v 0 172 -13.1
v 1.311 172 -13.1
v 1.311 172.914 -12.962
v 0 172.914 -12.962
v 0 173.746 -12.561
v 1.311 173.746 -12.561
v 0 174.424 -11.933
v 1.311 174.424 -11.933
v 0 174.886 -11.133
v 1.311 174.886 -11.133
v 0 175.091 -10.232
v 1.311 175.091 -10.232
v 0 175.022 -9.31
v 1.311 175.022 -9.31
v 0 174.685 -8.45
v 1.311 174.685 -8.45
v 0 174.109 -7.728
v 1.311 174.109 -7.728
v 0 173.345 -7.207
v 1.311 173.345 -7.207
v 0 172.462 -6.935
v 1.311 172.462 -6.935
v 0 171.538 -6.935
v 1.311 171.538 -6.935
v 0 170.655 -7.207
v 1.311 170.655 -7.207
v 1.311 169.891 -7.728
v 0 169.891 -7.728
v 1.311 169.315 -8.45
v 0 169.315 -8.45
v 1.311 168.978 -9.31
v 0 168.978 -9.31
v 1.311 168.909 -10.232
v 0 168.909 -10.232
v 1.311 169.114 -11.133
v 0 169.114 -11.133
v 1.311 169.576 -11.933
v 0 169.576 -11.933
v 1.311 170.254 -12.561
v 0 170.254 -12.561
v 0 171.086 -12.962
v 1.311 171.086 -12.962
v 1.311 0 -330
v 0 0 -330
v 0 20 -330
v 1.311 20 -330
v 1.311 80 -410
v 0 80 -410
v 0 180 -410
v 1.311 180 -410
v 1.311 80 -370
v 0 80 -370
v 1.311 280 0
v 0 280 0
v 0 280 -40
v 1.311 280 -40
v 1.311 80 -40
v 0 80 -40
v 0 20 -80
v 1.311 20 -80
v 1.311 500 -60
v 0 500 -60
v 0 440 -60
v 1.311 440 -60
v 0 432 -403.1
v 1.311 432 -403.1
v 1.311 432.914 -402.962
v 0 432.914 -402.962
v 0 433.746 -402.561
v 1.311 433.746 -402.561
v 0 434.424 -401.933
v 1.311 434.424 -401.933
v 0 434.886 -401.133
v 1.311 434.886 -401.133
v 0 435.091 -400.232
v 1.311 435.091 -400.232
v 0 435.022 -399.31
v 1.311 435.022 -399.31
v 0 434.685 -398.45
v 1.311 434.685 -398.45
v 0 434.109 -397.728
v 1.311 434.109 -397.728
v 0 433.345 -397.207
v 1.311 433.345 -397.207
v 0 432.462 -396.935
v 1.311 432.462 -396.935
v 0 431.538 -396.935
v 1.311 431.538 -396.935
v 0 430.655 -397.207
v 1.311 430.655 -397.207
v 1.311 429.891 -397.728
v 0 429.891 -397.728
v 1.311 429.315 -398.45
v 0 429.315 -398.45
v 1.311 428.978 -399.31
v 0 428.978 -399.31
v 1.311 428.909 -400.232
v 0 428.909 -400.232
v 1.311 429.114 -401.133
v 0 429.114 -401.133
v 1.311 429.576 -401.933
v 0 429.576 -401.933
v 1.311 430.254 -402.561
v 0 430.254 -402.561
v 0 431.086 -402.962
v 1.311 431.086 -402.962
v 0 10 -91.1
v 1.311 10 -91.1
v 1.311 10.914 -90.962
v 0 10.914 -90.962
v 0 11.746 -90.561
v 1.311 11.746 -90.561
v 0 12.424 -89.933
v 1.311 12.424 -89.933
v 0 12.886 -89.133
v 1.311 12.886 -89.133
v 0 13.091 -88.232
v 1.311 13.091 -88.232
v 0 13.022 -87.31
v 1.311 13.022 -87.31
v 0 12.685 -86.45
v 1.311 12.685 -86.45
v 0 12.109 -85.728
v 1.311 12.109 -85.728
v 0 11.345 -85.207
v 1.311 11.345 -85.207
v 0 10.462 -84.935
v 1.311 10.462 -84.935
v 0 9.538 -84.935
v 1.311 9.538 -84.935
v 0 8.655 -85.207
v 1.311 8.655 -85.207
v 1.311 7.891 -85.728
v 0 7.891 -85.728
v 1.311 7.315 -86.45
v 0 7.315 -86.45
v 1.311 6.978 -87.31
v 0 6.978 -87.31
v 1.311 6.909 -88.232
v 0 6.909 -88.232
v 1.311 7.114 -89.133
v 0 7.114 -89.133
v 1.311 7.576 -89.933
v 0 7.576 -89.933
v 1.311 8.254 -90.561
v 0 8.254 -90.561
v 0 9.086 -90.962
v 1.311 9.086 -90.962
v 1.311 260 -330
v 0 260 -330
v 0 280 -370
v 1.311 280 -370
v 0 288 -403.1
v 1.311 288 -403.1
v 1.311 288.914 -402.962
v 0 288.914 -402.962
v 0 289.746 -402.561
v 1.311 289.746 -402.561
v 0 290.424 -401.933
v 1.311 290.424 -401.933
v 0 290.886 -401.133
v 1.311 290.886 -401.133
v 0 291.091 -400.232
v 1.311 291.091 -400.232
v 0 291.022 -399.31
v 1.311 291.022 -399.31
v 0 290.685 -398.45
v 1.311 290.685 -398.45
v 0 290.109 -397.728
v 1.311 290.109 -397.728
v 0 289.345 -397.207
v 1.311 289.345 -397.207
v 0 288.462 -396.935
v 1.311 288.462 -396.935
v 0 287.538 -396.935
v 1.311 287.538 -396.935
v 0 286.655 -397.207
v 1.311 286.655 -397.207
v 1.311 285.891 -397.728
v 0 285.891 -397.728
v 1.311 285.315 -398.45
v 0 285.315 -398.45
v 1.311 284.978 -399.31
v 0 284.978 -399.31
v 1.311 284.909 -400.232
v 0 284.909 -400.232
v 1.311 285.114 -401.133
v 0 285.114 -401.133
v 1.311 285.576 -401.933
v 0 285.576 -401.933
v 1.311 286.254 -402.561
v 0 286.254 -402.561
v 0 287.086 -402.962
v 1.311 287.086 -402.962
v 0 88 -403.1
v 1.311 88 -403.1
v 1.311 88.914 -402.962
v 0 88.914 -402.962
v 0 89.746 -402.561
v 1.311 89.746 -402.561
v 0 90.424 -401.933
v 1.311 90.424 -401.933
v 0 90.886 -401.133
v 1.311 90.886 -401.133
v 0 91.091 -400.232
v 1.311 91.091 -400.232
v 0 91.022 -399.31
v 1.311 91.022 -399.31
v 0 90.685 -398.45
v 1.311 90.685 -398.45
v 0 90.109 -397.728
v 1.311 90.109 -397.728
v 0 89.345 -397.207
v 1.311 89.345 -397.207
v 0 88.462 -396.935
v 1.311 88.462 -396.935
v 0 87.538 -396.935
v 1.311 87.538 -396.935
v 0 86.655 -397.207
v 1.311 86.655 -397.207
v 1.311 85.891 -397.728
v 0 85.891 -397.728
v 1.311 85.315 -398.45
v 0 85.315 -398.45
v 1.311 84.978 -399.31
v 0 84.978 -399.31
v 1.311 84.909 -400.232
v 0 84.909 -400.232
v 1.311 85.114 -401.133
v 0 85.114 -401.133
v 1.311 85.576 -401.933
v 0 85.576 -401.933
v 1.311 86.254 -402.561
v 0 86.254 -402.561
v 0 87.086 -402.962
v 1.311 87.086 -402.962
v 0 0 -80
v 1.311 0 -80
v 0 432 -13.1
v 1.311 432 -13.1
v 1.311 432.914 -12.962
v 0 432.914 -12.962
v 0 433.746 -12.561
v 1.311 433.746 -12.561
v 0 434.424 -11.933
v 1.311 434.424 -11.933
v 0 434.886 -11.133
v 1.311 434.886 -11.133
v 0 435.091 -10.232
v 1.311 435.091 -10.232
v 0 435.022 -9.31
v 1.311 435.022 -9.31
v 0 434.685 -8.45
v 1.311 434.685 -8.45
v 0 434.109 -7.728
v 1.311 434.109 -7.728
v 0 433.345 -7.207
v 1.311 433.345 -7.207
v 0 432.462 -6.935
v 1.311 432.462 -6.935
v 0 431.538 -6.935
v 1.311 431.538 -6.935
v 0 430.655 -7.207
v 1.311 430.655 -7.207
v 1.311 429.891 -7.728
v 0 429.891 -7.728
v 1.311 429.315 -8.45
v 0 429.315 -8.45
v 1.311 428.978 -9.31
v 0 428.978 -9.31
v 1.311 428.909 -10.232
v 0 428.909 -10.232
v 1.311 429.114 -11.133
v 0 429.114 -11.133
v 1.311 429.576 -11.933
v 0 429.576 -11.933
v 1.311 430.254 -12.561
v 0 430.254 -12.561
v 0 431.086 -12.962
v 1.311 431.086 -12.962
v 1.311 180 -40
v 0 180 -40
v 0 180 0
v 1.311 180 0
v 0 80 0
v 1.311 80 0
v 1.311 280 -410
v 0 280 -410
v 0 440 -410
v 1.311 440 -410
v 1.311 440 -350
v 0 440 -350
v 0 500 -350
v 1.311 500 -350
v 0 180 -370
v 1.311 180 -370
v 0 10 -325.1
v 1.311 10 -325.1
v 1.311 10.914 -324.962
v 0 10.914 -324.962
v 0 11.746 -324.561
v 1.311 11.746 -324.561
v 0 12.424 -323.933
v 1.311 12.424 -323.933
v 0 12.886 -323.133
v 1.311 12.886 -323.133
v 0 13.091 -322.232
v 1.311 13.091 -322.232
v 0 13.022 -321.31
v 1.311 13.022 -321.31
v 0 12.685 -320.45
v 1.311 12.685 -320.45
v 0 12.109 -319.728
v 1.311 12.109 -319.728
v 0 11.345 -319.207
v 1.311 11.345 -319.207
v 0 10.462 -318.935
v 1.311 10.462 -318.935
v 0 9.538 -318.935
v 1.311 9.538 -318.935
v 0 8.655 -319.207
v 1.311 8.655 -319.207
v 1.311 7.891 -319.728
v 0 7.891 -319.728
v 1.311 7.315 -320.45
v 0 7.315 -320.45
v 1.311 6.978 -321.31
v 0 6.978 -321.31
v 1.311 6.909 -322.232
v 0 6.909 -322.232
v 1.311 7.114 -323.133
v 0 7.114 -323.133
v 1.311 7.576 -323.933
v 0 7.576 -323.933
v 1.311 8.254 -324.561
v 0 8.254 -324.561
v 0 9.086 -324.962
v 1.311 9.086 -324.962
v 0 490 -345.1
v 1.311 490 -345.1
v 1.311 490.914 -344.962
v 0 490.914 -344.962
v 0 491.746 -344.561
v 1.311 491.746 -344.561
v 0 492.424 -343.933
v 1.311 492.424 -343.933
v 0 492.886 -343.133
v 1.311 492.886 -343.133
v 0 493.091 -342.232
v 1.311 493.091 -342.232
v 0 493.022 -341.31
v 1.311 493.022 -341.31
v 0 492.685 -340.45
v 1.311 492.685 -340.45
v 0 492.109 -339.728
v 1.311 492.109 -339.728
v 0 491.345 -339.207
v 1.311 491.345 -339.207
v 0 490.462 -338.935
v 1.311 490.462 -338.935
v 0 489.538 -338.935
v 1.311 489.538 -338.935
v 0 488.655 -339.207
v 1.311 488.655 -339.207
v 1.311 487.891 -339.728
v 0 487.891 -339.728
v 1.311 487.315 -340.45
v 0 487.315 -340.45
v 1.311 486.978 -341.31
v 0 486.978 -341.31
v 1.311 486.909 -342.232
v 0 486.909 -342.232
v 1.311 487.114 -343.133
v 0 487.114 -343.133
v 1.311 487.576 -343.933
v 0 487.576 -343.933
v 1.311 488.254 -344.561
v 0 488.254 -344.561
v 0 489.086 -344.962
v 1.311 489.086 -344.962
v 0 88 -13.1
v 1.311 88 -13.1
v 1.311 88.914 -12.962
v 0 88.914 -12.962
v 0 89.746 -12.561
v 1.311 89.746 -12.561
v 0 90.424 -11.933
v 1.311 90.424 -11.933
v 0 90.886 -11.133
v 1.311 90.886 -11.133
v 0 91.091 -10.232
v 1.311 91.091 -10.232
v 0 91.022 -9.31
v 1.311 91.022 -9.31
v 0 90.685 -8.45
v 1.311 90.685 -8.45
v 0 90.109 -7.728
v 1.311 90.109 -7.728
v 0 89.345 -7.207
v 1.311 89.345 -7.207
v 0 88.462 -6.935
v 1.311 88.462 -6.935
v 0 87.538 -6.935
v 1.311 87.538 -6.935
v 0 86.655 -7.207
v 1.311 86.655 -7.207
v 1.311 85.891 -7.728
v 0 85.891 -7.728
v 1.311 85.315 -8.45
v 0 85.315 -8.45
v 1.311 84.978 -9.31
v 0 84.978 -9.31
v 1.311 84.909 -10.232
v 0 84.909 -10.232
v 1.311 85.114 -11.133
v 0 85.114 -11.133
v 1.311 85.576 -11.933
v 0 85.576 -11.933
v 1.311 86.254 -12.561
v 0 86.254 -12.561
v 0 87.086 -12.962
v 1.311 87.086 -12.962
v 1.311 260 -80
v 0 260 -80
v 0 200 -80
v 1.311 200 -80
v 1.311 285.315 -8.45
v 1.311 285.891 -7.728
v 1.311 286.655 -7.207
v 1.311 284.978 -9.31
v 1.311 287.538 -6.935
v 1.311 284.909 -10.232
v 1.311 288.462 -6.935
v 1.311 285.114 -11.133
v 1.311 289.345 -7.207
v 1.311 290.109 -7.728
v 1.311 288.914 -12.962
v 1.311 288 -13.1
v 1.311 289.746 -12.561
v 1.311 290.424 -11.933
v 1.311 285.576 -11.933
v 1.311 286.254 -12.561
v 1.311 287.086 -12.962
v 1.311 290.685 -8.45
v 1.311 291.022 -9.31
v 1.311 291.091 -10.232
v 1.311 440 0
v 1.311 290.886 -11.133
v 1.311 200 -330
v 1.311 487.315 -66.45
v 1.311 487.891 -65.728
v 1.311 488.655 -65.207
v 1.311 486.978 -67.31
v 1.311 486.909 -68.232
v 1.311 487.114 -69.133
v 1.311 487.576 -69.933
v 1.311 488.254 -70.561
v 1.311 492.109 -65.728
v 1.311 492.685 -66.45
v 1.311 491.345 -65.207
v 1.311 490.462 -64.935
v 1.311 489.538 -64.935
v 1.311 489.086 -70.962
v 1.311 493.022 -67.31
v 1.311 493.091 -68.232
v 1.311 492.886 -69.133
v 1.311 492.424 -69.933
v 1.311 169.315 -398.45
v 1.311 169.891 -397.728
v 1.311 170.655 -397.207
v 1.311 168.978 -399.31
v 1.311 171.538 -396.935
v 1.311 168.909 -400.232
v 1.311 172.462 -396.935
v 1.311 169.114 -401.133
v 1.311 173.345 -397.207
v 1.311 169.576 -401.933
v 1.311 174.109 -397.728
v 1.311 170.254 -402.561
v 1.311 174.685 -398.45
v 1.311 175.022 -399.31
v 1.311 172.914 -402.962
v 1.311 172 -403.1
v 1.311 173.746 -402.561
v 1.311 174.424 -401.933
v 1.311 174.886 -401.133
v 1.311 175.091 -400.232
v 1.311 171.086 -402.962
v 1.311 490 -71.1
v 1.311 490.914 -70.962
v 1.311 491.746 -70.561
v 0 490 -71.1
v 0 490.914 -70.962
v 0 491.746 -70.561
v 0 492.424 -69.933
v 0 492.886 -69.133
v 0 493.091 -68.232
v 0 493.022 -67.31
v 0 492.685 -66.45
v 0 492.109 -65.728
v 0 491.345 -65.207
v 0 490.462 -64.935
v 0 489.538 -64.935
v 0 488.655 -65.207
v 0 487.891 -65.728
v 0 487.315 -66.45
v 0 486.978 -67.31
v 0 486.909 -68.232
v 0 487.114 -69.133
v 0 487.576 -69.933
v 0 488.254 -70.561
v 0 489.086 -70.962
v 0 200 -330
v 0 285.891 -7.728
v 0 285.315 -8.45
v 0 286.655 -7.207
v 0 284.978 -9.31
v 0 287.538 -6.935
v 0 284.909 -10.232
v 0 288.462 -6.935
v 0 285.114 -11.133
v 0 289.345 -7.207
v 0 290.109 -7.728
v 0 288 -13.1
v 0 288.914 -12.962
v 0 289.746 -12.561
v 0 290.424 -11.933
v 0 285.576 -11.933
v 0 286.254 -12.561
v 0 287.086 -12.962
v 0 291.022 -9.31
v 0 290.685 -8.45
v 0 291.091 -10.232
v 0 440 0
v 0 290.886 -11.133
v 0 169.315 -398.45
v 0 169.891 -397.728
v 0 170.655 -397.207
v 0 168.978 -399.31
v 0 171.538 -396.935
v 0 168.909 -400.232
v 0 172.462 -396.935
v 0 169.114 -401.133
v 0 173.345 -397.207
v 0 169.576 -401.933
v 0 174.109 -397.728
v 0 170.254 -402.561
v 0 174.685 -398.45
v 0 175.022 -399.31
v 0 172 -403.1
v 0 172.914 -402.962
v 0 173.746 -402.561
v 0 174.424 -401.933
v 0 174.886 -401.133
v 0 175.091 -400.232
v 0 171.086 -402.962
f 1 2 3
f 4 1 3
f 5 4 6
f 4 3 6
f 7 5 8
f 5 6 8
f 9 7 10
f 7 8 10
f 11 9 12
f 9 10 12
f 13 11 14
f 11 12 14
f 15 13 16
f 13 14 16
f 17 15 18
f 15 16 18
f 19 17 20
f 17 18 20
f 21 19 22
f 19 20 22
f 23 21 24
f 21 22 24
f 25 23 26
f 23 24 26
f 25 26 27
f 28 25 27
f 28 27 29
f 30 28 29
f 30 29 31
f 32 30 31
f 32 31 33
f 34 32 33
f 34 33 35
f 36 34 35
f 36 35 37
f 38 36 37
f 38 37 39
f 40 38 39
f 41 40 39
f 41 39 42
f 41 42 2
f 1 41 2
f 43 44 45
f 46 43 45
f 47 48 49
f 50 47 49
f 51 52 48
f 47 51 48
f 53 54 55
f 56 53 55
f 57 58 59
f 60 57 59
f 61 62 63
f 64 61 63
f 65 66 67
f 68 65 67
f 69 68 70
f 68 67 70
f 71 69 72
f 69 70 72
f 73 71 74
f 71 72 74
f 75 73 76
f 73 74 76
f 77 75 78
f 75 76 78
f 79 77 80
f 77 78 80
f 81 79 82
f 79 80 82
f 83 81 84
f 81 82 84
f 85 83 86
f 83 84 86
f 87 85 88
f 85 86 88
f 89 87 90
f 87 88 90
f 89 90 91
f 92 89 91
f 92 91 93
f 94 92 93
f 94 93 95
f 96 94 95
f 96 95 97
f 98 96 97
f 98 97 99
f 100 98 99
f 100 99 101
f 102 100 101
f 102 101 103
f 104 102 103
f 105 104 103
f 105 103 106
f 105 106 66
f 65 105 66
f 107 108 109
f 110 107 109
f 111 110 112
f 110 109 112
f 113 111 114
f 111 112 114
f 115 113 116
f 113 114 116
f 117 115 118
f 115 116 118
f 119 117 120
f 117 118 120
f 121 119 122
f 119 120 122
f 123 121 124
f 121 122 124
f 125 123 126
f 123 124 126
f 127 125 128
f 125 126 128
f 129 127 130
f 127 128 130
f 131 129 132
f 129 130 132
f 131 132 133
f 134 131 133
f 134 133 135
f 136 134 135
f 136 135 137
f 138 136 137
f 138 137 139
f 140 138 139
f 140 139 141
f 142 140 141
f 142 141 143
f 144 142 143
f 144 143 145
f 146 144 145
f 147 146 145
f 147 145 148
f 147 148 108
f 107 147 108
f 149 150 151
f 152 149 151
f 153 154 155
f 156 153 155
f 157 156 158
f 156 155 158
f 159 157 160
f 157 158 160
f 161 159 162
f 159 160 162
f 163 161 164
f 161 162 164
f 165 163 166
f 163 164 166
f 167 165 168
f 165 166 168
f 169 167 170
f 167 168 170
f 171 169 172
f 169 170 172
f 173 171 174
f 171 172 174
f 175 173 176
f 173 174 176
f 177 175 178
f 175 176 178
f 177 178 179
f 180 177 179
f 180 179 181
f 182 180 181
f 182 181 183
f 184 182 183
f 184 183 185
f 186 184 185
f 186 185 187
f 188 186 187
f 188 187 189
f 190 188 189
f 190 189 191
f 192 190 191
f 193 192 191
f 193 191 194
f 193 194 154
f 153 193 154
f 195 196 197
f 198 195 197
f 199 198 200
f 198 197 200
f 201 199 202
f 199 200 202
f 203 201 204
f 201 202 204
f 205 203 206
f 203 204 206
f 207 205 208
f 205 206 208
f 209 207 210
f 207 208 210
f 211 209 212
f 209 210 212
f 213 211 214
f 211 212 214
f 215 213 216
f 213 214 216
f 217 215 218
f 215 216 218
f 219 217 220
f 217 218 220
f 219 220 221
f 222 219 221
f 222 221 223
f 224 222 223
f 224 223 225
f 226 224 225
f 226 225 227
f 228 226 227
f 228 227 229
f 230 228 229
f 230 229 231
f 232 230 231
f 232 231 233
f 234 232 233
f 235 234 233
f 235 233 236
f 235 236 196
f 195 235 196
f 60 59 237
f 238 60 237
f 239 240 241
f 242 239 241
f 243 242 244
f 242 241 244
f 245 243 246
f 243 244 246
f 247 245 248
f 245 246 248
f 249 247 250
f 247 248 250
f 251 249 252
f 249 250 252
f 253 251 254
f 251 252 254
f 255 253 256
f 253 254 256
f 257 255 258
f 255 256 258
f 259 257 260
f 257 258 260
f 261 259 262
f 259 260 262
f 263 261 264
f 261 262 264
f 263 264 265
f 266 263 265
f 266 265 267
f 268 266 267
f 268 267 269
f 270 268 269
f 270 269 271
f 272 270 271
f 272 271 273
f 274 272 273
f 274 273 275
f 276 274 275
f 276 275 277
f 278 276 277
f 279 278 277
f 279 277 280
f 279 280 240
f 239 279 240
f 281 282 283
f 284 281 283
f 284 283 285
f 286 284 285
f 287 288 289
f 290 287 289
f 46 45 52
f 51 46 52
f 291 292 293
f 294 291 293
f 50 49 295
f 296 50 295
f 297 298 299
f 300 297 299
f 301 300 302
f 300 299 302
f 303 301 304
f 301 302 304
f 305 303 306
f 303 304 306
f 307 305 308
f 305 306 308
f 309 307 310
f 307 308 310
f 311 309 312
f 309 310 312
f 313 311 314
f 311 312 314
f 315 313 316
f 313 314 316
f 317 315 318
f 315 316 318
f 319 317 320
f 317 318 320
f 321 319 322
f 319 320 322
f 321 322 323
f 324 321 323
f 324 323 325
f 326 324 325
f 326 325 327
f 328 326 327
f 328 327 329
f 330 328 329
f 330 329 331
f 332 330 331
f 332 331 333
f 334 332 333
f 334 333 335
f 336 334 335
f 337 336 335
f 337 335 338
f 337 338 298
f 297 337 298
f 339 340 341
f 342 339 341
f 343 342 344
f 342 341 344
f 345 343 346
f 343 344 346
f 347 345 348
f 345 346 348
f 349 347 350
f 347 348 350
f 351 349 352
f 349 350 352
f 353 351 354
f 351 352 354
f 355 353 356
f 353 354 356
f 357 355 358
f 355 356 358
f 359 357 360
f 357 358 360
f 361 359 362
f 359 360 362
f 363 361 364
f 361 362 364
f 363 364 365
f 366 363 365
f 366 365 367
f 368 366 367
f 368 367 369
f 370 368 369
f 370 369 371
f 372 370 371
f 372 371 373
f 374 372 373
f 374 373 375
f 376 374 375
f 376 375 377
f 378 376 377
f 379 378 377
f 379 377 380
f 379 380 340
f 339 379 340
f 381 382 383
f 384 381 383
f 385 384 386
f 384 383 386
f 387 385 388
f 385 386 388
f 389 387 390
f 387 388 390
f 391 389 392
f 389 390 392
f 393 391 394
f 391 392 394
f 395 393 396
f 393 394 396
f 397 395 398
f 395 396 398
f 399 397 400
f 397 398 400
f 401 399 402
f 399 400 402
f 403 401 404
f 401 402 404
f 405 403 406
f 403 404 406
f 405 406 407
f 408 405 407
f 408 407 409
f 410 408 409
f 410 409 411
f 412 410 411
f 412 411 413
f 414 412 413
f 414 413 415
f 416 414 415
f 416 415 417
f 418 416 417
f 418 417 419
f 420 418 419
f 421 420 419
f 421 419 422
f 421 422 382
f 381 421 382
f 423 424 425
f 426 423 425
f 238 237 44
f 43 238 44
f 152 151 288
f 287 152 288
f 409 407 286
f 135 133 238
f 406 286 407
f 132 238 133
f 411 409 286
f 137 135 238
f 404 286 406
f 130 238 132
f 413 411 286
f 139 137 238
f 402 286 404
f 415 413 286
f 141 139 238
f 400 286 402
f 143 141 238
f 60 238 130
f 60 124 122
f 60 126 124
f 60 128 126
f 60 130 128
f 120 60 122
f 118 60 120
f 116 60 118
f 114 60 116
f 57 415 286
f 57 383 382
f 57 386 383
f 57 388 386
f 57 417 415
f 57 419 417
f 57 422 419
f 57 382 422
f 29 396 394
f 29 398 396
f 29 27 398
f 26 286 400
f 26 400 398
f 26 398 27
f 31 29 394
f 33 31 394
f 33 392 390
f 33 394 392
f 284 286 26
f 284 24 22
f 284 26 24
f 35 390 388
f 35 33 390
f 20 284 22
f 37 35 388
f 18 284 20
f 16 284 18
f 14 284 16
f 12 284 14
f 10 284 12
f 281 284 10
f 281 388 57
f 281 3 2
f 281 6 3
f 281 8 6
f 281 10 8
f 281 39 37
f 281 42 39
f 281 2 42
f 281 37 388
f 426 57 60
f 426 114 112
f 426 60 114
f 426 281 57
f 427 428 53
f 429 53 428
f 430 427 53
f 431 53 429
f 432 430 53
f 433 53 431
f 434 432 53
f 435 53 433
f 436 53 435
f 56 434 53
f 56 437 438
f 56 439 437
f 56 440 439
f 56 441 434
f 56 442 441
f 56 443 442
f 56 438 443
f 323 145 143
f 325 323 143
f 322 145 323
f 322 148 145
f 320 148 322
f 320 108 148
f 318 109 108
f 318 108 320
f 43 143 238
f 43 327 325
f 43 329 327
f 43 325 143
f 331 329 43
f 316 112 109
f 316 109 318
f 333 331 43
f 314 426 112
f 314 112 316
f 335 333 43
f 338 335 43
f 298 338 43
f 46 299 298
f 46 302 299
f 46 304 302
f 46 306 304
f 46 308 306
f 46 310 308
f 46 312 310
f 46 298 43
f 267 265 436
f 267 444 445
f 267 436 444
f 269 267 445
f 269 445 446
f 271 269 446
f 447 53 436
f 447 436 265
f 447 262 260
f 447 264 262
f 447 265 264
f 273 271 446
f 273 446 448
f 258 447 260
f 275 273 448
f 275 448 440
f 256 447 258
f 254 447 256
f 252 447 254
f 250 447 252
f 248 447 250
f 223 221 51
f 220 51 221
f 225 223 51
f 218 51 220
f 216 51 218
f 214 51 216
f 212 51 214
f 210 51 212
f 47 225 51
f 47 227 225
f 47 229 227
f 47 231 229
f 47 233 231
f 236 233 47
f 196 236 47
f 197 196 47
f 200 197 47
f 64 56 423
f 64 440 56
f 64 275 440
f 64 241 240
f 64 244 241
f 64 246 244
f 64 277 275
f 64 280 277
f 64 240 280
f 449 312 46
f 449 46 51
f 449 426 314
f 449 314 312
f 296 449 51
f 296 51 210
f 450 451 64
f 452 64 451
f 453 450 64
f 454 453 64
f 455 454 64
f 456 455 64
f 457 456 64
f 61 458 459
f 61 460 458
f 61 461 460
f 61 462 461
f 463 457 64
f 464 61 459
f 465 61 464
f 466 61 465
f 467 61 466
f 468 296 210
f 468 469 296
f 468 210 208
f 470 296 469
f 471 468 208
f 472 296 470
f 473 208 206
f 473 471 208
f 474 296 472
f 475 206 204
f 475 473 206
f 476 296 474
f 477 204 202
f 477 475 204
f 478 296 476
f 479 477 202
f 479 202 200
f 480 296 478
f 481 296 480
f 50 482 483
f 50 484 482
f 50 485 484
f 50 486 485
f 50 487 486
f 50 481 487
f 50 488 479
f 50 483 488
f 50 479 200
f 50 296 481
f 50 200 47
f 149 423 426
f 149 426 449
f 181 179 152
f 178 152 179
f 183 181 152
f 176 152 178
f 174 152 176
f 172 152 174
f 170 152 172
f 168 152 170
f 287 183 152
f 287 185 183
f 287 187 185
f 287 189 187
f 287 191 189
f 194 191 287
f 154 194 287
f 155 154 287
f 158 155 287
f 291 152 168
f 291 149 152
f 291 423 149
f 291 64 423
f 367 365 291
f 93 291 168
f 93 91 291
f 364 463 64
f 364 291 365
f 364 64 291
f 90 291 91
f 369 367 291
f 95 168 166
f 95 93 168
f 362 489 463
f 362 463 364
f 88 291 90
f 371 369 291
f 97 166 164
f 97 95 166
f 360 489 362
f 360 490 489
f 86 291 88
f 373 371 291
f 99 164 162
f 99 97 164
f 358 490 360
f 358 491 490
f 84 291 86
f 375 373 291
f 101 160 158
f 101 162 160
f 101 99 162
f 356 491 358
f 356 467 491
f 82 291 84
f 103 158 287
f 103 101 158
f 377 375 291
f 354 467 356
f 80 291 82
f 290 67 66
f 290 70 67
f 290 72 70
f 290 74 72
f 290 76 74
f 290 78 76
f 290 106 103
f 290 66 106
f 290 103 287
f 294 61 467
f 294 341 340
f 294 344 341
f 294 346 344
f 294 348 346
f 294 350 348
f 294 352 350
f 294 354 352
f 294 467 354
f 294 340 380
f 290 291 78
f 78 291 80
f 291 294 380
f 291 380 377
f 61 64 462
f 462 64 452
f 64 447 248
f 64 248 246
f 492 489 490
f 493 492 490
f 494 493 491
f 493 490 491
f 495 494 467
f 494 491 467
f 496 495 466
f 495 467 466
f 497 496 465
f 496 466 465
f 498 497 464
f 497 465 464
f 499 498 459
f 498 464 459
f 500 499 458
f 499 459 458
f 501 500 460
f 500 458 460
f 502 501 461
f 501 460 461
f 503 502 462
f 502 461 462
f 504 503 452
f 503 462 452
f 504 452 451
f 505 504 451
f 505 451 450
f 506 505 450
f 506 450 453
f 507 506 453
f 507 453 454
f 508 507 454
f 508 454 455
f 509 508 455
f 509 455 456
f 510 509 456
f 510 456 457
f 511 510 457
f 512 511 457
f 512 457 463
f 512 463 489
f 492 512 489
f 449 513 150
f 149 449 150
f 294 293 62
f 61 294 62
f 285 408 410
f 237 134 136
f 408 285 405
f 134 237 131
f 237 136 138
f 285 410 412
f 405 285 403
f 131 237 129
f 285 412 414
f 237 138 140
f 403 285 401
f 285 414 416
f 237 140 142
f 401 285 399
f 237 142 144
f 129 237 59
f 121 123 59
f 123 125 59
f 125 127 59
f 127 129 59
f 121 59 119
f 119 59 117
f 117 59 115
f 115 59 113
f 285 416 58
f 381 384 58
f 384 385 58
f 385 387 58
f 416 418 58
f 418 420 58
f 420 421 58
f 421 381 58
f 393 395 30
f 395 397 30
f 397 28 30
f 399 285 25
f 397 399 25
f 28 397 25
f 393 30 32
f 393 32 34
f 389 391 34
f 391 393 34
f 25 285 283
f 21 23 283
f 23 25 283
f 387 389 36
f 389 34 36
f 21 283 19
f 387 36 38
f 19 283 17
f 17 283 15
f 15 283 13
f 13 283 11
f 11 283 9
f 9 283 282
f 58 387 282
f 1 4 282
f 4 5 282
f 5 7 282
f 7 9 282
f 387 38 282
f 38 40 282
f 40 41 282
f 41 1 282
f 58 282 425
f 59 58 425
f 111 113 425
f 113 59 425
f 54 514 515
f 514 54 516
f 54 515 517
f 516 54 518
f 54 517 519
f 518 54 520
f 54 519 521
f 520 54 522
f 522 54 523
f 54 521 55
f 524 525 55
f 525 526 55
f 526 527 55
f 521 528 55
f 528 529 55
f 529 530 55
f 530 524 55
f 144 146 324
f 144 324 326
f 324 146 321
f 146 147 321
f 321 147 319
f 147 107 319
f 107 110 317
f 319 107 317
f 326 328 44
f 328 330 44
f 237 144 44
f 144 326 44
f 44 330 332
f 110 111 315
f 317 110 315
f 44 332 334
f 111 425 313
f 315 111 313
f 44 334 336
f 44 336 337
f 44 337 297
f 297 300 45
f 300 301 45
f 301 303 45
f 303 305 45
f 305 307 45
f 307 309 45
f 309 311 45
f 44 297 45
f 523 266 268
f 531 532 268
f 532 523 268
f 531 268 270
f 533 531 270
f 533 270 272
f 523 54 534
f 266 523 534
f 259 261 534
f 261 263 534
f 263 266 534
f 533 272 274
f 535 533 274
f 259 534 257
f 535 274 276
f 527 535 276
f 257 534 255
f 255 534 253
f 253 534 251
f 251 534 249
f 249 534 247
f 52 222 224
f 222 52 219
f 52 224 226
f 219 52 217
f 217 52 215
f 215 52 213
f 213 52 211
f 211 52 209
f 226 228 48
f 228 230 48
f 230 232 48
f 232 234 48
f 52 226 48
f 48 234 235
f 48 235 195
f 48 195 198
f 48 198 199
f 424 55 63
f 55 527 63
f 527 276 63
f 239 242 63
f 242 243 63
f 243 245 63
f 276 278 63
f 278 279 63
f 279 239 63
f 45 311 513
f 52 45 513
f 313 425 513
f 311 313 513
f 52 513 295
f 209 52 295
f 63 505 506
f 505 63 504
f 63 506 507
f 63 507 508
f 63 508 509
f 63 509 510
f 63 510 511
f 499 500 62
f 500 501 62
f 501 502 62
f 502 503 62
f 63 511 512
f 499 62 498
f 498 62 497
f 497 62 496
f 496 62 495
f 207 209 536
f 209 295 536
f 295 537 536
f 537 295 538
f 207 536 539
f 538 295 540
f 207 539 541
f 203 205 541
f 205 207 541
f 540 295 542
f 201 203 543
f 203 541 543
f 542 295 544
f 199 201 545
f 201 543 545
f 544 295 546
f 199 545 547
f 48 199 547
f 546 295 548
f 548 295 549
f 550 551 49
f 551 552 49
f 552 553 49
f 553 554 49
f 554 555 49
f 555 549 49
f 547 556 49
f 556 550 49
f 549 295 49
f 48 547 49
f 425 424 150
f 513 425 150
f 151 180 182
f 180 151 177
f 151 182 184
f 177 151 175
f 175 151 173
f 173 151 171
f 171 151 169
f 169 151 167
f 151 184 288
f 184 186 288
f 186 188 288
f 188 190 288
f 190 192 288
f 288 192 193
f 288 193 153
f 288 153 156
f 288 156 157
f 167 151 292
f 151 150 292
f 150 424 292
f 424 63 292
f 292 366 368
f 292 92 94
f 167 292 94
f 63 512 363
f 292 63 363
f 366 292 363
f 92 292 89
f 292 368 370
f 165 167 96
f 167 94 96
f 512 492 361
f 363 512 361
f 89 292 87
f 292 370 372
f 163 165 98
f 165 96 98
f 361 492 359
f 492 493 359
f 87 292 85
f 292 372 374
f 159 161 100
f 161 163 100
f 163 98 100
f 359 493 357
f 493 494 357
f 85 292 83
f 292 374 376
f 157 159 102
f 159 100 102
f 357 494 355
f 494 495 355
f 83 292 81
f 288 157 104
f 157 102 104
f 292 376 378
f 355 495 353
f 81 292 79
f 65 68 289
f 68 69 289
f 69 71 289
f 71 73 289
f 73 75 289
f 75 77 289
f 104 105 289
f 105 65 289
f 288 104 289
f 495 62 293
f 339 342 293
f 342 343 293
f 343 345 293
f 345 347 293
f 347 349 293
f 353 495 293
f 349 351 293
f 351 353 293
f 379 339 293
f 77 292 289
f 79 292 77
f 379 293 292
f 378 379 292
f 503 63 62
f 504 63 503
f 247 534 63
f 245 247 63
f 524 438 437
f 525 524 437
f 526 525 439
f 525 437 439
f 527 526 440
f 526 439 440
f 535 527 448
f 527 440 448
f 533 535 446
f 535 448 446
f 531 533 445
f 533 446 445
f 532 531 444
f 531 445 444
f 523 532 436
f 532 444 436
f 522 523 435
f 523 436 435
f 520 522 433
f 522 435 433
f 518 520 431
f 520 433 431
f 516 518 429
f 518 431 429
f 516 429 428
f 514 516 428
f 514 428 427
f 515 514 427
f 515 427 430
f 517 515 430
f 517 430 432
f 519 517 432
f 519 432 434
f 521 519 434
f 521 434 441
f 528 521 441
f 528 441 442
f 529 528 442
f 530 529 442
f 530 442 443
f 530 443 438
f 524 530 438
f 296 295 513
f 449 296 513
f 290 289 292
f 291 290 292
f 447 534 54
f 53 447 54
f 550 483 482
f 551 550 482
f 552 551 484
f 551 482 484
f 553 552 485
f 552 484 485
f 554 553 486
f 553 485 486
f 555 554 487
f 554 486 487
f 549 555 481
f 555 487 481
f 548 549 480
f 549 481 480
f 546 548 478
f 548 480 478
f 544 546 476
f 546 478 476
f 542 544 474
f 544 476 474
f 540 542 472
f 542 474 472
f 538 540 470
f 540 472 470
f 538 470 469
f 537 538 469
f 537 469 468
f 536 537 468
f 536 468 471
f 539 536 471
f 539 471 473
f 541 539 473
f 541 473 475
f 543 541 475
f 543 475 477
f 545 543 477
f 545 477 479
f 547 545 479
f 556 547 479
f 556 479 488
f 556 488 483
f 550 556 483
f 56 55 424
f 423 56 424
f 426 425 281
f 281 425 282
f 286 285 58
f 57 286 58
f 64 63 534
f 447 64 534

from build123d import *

# Parameters (mm, degrees)
BOSS_EXTRUDE1_DEPTH = 1.31064
SKETCH2_R           = 3.1
CUT_EXTRUDE1_DEPTH  = 10


with BuildPart() as part:
    # Sketch1 → Boss-Extrude1 (new body)
    with BuildSketch(Plane(origin=(0, 0, 0), x_dir=(0, 0, -1), z_dir=(1, 0, 0))):
        Polygon((0, 440), (0, 280), (40, 280), (80, 260), (80, 200), (40, 180), (0, 180), (0, 80), (40, 80), (80, 20), (80, 0), (330, 0), (330, 20), (370, 80), (410, 80), (410, 180), (370, 180), (330, 200), (330, 260), (370, 280), (410, 280), (410, 440), (350, 440), (350, 500), (60, 500), (60, 440), align=None)
    extrude(amount=BOSS_EXTRUDE1_DEPTH)

    # Sketch2 → Cut-Extrude1 (cut)
    with BuildSketch(Plane(origin=(1.31064, 0, 0), x_dir=(0, 0, -1), z_dir=(1, 0, 0))):
        with Locations((10, 432)):
            Circle(SKETCH2_R)
        with Locations((10, 288)):
            Circle(SKETCH2_R)
        with Locations((10, 172)):
            Circle(SKETCH2_R)
        with Locations((10, 88)):
            Circle(SKETCH2_R)
        with Locations((88, 10)):
            Circle(SKETCH2_R)
        with Locations((68, 490)):
            Circle(SKETCH2_R)
        with Locations((322, 10)):
            Circle(SKETCH2_R)
        with Locations((400, 88)):
            Circle(SKETCH2_R)
        with Locations((400, 172)):
            Circle(SKETCH2_R)
        with Locations((400, 288)):
            Circle(SKETCH2_R)
        with Locations((400, 432)):
            Circle(SKETCH2_R)
        with Locations((342, 490)):
            Circle(SKETCH2_R)
    extrude(amount=-CUT_EXTRUDE1_DEPTH, mode=Mode.SUBTRACT)


solid = part.part
